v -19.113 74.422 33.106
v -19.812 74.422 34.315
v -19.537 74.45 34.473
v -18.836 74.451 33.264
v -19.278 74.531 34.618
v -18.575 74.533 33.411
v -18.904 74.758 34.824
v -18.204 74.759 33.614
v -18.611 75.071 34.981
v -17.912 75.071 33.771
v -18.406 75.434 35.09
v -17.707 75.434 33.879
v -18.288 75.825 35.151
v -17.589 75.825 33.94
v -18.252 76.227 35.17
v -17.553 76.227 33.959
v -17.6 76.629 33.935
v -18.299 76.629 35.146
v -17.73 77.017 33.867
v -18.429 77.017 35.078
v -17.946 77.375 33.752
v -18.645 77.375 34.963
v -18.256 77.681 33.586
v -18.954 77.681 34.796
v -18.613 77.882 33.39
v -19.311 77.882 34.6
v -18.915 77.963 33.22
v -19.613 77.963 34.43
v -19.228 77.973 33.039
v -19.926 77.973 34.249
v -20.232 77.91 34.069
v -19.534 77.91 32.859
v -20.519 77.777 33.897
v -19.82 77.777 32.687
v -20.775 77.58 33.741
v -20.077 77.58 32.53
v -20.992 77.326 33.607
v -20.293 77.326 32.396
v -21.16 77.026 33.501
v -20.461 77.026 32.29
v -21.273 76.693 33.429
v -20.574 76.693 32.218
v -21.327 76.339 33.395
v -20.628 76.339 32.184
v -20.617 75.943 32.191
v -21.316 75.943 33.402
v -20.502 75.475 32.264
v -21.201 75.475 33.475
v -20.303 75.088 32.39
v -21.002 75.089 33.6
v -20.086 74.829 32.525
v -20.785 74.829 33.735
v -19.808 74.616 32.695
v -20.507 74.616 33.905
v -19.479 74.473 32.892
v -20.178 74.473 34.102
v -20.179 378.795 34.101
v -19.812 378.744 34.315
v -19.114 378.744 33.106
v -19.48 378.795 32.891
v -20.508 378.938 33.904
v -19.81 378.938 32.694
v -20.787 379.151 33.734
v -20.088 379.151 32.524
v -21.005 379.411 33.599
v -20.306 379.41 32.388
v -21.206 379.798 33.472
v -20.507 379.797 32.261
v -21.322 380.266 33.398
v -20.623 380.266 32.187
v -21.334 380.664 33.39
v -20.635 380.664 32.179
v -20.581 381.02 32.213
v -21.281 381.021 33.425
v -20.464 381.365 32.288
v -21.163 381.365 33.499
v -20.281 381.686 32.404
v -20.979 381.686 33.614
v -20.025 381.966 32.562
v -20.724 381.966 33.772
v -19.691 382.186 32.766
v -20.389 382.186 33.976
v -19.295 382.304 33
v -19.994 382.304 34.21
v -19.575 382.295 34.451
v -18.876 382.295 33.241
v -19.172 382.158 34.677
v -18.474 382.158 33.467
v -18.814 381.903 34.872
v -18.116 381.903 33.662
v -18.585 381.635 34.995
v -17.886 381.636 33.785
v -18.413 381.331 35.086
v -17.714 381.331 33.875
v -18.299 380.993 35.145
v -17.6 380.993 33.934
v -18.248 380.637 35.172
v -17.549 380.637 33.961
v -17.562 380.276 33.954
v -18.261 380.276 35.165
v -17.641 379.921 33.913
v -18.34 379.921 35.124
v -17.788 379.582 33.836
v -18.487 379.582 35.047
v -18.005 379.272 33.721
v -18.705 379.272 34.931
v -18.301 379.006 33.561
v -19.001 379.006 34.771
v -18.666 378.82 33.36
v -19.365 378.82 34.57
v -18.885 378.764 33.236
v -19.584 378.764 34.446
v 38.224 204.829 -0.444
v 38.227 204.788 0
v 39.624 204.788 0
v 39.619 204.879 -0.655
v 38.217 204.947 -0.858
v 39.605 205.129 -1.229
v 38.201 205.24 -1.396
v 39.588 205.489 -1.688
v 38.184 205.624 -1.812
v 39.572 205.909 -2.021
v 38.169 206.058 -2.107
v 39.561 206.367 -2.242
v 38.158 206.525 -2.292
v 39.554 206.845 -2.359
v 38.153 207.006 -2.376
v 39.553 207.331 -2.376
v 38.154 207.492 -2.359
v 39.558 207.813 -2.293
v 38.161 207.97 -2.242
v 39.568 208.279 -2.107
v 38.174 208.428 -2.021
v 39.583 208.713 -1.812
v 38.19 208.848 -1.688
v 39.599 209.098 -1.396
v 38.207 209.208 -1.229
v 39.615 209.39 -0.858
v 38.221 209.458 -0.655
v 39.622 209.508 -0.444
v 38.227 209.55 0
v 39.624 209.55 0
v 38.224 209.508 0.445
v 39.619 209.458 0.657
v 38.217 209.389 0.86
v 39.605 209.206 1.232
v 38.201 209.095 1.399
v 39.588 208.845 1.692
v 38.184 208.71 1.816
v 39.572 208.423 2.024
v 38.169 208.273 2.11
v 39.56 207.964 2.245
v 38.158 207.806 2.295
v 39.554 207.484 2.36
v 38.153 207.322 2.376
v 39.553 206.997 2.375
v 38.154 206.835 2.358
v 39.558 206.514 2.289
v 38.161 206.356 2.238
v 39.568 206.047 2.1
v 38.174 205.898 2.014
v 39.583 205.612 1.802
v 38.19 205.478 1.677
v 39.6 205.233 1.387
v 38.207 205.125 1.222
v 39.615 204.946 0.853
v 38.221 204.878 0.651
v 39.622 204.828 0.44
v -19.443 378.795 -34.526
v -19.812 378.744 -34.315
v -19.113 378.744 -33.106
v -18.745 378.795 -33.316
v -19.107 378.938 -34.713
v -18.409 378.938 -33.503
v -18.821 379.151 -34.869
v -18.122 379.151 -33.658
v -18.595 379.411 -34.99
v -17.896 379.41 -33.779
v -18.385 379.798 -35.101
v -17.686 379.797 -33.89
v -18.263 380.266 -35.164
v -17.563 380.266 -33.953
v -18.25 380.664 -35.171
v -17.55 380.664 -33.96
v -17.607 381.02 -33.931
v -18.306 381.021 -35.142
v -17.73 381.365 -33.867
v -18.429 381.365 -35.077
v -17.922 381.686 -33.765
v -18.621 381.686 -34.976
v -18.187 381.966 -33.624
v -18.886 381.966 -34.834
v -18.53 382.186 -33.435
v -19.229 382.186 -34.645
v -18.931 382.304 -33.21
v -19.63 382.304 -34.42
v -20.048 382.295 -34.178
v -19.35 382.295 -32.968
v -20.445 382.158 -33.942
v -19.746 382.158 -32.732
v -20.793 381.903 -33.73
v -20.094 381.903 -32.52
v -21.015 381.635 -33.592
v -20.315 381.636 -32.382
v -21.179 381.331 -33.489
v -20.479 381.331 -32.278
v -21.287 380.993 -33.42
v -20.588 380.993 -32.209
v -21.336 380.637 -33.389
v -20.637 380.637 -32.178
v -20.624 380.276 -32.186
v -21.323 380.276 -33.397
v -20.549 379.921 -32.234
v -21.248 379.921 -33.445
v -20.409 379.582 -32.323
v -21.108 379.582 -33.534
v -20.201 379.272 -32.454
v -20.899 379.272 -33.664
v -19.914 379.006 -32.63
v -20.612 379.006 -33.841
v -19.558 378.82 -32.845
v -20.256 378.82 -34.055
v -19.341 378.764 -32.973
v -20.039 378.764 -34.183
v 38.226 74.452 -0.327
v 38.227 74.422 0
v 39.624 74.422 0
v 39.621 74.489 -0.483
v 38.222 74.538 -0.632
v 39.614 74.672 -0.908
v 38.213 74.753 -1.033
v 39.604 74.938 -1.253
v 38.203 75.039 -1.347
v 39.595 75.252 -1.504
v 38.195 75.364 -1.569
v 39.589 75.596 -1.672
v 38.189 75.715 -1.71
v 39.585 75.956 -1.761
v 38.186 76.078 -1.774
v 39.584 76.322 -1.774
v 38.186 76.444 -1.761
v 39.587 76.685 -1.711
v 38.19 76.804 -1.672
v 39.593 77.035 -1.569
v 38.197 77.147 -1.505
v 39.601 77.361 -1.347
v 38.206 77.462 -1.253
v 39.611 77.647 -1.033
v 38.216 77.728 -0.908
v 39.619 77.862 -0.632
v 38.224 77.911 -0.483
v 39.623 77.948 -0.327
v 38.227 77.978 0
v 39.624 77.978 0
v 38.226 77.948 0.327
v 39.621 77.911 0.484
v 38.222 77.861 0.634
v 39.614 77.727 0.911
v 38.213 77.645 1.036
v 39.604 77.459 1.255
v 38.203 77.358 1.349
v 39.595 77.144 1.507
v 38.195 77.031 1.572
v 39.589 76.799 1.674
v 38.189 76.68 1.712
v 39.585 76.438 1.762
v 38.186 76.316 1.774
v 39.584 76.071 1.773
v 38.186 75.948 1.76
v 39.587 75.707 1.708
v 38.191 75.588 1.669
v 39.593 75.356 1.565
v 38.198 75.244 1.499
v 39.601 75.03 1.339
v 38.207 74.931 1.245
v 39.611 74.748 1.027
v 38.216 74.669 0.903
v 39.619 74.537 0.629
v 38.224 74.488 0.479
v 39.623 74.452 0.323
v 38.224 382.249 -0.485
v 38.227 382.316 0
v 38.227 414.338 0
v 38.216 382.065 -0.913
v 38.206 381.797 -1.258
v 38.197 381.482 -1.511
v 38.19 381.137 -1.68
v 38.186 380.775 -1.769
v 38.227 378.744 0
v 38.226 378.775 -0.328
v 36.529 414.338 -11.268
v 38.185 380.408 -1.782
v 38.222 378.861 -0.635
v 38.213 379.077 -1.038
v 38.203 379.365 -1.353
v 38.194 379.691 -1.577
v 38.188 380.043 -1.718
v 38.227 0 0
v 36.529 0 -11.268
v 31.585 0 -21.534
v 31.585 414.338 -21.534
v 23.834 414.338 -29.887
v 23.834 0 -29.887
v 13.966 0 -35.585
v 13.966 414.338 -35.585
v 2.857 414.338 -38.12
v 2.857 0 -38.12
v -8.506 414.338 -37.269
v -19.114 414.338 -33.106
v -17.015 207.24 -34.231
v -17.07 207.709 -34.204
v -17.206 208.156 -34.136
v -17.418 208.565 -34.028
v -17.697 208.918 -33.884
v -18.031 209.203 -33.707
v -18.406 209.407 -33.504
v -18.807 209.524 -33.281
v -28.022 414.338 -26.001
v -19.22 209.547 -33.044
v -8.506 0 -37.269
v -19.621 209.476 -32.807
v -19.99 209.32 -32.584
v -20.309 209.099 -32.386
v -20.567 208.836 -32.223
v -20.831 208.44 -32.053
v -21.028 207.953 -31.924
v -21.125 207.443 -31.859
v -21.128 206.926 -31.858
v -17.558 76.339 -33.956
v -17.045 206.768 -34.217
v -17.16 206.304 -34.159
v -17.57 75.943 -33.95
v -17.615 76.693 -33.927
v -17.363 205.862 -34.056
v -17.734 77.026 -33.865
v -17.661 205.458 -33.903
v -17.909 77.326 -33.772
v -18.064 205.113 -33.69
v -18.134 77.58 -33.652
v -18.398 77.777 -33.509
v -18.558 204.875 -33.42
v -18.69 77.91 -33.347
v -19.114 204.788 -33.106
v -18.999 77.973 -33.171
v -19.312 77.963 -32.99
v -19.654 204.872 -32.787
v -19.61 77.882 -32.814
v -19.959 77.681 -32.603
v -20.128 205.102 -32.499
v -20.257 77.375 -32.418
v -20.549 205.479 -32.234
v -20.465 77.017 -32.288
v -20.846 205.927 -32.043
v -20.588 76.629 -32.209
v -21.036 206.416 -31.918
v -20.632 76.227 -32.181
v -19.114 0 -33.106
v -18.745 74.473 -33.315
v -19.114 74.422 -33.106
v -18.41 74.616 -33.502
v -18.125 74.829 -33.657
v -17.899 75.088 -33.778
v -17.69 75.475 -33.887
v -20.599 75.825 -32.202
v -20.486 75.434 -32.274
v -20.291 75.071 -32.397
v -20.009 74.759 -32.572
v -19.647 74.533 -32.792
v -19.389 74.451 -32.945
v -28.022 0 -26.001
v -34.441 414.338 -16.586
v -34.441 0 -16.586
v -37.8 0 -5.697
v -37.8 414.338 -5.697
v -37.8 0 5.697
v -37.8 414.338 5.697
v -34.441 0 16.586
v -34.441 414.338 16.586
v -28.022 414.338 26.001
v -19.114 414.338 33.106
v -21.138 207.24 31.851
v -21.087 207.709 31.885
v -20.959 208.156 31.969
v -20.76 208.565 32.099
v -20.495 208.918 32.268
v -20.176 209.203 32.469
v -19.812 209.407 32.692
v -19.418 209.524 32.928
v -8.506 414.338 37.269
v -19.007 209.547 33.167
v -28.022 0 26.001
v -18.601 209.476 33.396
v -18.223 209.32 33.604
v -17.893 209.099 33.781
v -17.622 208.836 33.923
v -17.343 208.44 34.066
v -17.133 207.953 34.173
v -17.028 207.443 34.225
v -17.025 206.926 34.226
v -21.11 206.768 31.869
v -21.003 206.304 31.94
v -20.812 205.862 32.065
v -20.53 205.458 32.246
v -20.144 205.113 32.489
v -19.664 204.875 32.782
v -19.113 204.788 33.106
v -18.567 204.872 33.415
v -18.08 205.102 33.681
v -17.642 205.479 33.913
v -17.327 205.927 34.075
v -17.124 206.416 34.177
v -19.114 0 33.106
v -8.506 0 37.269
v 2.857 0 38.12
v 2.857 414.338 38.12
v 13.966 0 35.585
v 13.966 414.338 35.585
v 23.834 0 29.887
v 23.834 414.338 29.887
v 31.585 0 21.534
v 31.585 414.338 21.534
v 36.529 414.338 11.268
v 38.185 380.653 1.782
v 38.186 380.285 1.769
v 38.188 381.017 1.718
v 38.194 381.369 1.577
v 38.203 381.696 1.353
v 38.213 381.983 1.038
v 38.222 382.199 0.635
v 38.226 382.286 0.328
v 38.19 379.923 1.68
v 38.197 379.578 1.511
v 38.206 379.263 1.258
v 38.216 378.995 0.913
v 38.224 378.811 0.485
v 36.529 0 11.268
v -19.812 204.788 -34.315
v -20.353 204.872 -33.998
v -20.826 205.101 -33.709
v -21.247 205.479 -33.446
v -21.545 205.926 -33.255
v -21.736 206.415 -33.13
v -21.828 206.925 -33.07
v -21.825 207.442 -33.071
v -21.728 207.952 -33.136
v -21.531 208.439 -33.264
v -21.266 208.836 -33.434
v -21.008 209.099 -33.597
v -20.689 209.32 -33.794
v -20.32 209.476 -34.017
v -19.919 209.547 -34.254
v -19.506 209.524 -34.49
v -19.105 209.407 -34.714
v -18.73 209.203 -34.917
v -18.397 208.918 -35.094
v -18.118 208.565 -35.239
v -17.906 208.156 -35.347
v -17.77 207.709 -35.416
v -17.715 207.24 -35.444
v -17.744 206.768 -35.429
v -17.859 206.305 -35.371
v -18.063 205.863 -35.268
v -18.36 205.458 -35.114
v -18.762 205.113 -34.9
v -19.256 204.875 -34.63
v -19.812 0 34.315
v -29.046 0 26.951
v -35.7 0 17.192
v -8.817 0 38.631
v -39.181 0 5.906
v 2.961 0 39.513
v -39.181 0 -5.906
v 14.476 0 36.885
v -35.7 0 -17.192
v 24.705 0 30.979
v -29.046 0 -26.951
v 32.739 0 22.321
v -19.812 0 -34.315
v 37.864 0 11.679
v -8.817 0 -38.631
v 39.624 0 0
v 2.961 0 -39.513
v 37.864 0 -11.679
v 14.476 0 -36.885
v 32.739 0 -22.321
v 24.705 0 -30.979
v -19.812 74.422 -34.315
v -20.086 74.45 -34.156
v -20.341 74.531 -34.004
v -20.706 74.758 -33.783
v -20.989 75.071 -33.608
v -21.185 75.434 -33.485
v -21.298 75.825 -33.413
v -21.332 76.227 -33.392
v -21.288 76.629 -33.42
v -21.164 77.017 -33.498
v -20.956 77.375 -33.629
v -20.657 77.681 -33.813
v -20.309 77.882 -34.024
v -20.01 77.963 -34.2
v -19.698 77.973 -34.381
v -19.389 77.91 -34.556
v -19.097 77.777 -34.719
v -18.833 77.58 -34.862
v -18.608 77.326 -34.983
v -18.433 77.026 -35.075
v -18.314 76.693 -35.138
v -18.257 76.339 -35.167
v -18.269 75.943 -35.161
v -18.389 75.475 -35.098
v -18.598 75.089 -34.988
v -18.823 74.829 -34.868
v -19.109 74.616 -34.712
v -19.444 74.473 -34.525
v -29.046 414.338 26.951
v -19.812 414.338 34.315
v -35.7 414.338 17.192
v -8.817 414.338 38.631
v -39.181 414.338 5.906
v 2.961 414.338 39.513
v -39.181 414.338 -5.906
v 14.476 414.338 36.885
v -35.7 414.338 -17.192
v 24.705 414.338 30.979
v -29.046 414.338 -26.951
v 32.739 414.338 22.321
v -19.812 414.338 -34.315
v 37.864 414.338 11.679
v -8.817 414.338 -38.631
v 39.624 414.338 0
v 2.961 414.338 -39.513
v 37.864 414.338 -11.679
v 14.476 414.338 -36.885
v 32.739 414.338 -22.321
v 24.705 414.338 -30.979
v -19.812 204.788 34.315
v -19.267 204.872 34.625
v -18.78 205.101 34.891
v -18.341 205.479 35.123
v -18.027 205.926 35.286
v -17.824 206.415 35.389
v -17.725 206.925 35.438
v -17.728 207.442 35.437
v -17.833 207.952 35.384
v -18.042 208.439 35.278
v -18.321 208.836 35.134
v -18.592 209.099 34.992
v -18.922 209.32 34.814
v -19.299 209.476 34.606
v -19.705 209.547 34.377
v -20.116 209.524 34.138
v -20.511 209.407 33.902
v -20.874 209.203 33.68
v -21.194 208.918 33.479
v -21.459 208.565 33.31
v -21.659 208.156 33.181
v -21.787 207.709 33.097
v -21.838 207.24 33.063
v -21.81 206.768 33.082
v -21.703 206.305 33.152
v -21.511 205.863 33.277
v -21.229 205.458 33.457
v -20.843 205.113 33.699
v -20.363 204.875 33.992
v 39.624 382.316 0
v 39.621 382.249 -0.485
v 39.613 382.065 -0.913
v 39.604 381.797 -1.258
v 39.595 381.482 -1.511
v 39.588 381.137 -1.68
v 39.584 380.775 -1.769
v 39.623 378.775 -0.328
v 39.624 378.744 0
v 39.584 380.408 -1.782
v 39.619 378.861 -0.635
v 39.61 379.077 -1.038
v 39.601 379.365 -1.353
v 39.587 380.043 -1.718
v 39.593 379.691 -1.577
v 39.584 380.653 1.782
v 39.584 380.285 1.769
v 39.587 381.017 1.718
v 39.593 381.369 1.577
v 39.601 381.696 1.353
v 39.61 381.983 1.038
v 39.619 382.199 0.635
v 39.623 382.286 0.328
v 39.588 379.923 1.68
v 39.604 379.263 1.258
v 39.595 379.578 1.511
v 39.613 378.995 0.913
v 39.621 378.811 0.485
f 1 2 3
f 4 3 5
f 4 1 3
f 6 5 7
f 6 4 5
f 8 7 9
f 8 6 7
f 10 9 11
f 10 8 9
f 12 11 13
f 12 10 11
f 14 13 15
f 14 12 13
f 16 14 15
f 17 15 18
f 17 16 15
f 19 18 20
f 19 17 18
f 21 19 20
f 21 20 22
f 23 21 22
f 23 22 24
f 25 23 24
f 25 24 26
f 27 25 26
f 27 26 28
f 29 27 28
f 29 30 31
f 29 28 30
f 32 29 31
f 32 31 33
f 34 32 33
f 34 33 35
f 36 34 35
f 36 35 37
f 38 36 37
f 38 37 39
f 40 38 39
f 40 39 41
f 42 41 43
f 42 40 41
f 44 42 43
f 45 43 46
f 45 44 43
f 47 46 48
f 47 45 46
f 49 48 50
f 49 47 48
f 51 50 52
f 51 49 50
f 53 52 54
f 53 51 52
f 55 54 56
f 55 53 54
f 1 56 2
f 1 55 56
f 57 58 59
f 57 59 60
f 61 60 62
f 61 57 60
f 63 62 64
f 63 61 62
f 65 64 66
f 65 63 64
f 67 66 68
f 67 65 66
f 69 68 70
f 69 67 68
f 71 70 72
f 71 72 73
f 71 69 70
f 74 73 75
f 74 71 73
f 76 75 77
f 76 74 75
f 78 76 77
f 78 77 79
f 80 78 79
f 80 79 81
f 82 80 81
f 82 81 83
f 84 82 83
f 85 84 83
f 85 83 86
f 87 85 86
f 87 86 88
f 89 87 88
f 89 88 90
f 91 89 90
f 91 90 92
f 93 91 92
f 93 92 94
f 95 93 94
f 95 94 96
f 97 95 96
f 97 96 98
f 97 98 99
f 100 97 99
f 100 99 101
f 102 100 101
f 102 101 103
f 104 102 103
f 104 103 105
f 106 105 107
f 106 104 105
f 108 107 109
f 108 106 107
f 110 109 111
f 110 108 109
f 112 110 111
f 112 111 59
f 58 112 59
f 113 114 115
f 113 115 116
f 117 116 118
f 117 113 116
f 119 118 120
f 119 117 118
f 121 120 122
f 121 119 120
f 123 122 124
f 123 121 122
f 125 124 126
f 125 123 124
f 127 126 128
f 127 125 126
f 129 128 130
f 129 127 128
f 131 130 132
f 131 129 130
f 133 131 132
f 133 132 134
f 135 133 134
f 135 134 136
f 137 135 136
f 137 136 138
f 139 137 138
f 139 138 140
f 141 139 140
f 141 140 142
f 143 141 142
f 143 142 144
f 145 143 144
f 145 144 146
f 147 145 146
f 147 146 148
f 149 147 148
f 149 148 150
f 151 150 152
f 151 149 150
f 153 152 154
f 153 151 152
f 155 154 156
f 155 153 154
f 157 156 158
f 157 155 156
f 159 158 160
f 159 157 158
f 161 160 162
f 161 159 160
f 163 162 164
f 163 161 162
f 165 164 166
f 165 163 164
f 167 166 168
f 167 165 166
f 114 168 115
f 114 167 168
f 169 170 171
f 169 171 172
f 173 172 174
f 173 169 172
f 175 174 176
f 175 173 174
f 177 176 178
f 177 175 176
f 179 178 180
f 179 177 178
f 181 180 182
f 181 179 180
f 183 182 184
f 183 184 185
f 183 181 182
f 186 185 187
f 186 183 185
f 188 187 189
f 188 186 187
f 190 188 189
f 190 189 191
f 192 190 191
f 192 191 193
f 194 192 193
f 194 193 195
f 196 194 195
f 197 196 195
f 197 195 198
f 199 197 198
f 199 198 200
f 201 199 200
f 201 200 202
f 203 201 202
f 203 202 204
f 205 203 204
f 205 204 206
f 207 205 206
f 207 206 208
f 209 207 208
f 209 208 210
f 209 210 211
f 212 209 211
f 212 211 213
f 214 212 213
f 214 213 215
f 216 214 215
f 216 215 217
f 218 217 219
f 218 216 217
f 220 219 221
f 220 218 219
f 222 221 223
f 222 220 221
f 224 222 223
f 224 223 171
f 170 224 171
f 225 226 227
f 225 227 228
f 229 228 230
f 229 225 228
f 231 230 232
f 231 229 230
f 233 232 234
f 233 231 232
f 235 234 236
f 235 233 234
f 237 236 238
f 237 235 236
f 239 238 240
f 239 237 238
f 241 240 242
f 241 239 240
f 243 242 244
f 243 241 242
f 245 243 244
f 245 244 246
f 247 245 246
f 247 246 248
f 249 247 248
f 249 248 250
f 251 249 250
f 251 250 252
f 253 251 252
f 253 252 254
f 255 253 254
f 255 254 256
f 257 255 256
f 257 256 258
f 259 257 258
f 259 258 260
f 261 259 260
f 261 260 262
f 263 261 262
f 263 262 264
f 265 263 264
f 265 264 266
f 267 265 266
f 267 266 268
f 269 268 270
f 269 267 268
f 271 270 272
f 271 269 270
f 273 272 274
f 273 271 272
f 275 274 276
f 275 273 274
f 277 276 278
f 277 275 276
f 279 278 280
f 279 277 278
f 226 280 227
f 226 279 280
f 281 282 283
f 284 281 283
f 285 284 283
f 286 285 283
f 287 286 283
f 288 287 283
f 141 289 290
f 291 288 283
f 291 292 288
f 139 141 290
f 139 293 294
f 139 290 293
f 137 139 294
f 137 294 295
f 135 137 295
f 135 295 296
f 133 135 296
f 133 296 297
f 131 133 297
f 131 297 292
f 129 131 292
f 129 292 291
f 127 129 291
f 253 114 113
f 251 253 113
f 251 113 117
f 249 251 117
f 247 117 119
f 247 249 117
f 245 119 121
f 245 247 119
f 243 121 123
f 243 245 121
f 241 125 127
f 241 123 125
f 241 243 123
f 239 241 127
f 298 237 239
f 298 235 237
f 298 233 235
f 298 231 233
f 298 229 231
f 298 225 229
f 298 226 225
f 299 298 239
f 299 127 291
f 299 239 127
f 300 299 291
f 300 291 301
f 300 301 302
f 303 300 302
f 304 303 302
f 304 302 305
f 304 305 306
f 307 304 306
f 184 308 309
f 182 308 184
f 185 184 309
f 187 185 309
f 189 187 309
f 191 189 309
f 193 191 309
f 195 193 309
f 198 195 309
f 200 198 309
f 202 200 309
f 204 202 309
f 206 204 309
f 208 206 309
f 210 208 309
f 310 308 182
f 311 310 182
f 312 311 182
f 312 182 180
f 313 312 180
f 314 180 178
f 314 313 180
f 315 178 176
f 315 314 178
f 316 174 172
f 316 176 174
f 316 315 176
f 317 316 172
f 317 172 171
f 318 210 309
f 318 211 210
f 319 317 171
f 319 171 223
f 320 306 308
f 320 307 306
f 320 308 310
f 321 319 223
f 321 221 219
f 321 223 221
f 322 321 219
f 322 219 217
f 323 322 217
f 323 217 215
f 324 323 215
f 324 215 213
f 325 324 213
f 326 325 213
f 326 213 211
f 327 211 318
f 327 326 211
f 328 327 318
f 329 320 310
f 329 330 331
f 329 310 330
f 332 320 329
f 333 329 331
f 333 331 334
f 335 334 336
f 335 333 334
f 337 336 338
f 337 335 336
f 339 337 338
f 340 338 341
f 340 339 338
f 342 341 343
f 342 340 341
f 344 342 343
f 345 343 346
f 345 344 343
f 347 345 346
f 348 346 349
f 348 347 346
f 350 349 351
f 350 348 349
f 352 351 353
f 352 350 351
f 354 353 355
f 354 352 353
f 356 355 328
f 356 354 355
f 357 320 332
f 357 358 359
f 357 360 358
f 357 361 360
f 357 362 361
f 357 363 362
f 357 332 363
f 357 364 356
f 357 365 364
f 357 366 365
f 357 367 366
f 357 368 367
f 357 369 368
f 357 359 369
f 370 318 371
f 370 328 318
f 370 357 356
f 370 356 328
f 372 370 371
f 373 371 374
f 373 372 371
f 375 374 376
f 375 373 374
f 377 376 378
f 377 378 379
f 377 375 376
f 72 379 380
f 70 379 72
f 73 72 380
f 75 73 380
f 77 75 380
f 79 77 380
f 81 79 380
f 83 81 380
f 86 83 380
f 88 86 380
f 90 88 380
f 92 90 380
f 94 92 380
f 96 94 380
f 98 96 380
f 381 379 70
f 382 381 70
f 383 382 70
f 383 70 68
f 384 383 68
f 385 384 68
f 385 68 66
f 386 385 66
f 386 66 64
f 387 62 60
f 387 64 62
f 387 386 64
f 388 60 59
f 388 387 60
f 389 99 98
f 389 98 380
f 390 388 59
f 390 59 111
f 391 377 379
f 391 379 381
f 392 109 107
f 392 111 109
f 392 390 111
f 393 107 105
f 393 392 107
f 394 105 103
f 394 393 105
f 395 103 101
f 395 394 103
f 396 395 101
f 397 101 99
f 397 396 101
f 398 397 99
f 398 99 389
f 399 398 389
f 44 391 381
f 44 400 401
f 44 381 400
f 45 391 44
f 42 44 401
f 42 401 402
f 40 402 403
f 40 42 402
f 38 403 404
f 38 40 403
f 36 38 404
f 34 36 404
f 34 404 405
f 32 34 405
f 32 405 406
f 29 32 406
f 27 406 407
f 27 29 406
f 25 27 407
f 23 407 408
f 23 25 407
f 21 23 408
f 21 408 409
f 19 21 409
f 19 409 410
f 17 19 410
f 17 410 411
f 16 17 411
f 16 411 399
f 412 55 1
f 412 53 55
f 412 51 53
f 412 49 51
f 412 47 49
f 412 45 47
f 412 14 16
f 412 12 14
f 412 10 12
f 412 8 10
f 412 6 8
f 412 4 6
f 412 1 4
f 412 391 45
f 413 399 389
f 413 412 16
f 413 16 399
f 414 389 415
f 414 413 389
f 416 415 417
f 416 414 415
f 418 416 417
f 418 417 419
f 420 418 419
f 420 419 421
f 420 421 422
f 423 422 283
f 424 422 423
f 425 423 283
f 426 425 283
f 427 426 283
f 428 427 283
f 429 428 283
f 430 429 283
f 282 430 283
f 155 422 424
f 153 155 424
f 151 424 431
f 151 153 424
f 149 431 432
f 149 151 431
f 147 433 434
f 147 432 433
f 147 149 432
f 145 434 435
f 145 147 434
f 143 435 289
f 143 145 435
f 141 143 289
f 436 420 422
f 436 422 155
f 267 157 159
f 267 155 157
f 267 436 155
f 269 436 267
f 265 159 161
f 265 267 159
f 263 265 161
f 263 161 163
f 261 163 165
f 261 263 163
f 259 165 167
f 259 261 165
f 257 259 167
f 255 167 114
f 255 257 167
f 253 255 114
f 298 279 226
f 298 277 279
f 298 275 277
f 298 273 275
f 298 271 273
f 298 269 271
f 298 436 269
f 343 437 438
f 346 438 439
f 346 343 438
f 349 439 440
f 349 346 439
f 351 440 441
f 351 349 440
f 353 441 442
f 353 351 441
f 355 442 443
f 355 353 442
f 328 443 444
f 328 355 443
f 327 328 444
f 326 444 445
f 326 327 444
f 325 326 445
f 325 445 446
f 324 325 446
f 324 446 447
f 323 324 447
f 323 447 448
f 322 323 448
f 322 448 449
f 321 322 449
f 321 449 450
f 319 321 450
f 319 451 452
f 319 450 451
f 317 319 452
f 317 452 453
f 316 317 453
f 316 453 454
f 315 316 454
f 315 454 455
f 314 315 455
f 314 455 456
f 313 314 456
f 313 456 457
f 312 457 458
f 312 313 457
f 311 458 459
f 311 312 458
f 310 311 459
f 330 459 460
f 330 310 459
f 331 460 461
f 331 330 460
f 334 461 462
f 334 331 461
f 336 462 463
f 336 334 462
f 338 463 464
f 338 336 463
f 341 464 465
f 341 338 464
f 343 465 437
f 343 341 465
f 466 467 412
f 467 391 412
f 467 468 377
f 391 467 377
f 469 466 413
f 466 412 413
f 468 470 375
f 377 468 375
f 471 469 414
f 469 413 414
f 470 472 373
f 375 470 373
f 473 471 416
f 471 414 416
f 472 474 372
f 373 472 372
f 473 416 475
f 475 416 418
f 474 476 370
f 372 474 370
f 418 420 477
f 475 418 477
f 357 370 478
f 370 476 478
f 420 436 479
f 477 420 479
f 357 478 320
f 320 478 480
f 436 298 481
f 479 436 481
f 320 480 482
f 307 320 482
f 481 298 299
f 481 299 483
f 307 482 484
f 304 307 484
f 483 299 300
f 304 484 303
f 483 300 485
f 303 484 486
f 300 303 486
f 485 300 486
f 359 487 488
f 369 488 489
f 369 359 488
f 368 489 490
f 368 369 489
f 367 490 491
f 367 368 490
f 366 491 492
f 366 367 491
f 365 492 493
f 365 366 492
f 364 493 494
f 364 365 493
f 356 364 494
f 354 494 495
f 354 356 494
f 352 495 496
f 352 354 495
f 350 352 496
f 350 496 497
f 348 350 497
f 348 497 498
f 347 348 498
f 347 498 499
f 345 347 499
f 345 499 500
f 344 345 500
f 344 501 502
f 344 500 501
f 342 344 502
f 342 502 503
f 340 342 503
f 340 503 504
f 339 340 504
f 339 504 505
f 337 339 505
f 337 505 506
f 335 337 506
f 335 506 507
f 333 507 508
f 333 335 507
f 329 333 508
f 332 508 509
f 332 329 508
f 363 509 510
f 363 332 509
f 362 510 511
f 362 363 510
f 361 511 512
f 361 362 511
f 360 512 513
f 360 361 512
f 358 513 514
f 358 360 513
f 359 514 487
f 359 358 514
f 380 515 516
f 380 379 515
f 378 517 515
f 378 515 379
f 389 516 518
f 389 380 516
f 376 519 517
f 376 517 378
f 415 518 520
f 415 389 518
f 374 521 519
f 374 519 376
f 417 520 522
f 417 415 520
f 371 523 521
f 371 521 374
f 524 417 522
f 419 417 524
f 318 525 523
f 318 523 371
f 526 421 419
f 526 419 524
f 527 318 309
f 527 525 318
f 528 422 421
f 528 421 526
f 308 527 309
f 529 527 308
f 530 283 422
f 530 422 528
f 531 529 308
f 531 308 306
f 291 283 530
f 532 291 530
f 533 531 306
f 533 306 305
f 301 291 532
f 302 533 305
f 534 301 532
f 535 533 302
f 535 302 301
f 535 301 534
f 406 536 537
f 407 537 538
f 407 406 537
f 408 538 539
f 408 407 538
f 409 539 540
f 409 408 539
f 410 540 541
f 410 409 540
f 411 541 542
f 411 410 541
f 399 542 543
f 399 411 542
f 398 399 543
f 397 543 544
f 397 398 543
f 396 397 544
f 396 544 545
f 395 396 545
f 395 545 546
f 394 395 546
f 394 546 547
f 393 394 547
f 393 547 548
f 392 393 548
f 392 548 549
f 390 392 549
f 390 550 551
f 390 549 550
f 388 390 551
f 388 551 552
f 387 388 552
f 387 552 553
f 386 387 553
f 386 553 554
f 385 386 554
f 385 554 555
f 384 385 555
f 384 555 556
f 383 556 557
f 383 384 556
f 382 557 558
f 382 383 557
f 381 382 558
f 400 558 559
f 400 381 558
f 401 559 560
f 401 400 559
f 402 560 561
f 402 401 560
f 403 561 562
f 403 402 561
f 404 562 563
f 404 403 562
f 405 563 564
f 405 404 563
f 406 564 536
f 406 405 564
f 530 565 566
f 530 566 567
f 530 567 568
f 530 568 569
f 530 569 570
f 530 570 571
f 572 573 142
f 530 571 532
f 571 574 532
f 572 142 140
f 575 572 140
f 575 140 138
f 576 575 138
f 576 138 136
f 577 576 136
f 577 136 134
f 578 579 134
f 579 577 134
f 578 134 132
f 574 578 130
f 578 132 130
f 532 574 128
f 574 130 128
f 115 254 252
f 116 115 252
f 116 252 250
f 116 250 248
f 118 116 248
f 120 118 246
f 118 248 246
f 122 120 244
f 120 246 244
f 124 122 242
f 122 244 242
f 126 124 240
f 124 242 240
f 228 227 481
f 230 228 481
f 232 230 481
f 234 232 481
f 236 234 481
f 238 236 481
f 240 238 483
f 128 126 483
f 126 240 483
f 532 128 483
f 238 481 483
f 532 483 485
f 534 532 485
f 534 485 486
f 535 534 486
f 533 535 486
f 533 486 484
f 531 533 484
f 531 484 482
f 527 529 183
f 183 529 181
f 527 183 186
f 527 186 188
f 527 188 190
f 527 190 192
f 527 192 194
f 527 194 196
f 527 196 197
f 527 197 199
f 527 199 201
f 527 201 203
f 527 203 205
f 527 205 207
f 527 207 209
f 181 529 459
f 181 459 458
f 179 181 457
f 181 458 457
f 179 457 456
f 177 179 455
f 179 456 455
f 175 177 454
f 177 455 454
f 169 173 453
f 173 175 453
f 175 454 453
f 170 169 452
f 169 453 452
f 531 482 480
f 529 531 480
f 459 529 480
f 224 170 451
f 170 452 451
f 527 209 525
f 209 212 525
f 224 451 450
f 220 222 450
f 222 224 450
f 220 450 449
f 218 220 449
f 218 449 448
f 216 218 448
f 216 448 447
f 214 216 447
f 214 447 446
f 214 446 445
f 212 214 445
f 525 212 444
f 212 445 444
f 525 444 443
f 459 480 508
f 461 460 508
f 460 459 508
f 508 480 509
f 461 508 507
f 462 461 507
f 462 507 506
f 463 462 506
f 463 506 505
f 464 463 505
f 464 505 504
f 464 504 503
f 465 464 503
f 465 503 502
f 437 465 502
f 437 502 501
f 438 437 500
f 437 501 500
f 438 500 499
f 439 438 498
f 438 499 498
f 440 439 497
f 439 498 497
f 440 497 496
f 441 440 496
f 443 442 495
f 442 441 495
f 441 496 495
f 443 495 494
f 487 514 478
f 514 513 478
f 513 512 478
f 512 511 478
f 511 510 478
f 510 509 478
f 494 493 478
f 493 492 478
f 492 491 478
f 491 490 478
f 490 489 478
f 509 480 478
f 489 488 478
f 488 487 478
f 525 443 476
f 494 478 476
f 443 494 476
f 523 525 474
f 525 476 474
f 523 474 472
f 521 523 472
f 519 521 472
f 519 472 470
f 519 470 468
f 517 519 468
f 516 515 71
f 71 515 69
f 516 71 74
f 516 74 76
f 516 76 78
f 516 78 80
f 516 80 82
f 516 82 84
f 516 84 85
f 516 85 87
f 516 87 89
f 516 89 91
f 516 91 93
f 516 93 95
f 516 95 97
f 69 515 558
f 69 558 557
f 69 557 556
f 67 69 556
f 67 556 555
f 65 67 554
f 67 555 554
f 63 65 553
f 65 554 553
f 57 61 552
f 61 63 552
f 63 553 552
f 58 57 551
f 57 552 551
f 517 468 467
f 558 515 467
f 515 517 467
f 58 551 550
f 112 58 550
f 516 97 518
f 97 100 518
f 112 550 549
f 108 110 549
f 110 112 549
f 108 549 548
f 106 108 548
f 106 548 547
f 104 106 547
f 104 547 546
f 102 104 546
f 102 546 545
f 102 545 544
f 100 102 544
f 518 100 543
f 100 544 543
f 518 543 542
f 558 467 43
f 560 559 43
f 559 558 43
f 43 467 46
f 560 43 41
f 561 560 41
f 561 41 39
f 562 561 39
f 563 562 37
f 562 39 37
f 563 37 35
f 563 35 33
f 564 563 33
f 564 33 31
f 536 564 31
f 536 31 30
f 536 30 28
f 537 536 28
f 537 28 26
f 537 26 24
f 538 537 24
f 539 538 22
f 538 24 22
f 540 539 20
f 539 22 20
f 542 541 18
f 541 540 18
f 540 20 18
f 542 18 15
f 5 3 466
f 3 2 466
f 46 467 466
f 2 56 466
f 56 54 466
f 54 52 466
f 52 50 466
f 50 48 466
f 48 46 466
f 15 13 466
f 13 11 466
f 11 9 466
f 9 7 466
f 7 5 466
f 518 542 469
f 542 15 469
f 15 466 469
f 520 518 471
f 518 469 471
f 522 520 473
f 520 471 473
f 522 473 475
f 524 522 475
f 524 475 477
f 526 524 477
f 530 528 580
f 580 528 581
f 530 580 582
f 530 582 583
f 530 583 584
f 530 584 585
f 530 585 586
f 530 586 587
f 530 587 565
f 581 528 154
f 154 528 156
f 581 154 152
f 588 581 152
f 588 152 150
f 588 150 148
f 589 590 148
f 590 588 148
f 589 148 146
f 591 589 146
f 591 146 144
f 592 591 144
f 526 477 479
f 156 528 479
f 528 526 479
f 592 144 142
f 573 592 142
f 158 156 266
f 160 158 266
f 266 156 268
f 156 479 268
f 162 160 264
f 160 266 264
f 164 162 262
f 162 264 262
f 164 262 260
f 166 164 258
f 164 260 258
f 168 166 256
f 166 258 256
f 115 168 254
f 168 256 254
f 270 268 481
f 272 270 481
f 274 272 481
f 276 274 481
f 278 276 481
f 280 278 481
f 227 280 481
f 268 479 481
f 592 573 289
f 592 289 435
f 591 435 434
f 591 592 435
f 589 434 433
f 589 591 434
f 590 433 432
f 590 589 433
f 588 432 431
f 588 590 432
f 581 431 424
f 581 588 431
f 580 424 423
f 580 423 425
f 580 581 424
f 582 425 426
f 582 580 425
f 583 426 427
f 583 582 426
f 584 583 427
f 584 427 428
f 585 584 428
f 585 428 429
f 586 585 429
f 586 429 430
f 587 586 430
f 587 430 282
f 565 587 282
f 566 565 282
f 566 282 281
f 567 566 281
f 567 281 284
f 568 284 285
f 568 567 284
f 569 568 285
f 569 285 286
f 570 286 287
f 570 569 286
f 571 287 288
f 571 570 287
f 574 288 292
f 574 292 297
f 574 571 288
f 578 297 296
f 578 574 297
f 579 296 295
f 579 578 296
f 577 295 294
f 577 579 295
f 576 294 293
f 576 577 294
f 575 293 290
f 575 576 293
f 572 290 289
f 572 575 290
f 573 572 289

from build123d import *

# Parameters (mm, degrees)
SKETCH1_R                        = 39.624
SKETCH1_R_2                      = 38.227
BOSS_EXTRUDE1_DEPTH              = 414.3375
CUT_EXTRUDE1_START               = -1.438371
SKETCH2_R                        = 1.778
CUT_EXTRUDE1_DEPTH               = 1.438371
CIRPATTERN1_COUNT                = 3
PRESSURE_START                   = -1.471239
SKETCH3_R                        = 2.38125
PRESSURE_EQUALIZATION_HOLE_DEPTH = 1.471239
CIRPATTERN2_COUNT                = 3
SKETCH4_R                        = 1.7859375
CUT_EXTRUDE3_DEPTH               = 1.438742
CIRPATTERN3_COUNT                = 3


with BuildPart() as part:
    # Sketch1 → Boss-Extrude1 (new body)
    with BuildSketch(Plane(origin=(0, 0, 0), x_dir=(1, 0, 0), z_dir=(0, 1, 0))):
        Circle(SKETCH1_R)
        Circle(SKETCH1_R_2, mode=Mode.SUBTRACT)
    extrude(amount=BOSS_EXTRUDE1_DEPTH)

    # Sketch2 → Cut-Extrude1 (cut)
    with BuildSketch(Plane(origin=(-19.812, 0, 34.3153906), x_dir=(0, -1, 0), z_dir=(-0.5, 0, 0.866025404)).offset(CUT_EXTRUDE1_START)):
        with Locations((-76.2, 0)):
            Circle(SKETCH2_R)
    cut_extrude1 = extrude(amount=CUT_EXTRUDE1_DEPTH, mode=Mode.SUBTRACT)

    # CirPattern1: Cut-Extrude1 ×3 about axis
    cirpattern1_axis = Axis((0, -7.62, 0), (0, 1, 0))
    for i in range(1, CIRPATTERN1_COUNT):
        add(cut_extrude1.rotate(cirpattern1_axis, i * 360 / CIRPATTERN1_COUNT), mode=Mode.SUBTRACT)

    # Sketch3 → Pressure Equalization Hole (cut)
    with BuildSketch(Plane(origin=(-19.812, 0, 34.3153906), x_dir=(0, -1, 0), z_dir=(-0.5, 0, 0.866025404)).offset(PRESSURE_START)):
        with Locations((-207.16875, 0)):
            Circle(SKETCH3_R)
    pressure_equalization_hole = extrude(amount=PRESSURE_EQUALIZATION_HOLE_DEPTH, mode=Mode.SUBTRACT)

    # CirPattern2: Pressure Equalization Hole ×3 about axis
    cirpattern2_axis = Axis((0, -7.62, 0), (0, 1, 0))
    for i in range(1, CIRPATTERN2_COUNT):
        add(pressure_equalization_hole.rotate(cirpattern2_axis, i * 360 / CIRPATTERN2_COUNT), mode=Mode.SUBTRACT)

    # Sketch4 → Cut-Extrude3 (cut)
    with BuildSketch(Plane(origin=(39.624, 0, 0), x_dir=(0, -1, 0), z_dir=(-1, 0, 0))):
        with Locations((-380.5301, 0)):
            Circle(SKETCH4_R)
    cut_extrude3 = extrude(amount=CUT_EXTRUDE3_DEPTH, mode=Mode.SUBTRACT)

    # CirPattern3: Cut-Extrude3 ×3 about axis
    cirpattern3_axis = Axis((0, -7.62, 0), (0, 1, 0))
    for i in range(1, CIRPATTERN3_COUNT):
        add(cut_extrude3.rotate(cirpattern3_axis, i * 360 / CIRPATTERN3_COUNT), mode=Mode.SUBTRACT)


solid = part.part
